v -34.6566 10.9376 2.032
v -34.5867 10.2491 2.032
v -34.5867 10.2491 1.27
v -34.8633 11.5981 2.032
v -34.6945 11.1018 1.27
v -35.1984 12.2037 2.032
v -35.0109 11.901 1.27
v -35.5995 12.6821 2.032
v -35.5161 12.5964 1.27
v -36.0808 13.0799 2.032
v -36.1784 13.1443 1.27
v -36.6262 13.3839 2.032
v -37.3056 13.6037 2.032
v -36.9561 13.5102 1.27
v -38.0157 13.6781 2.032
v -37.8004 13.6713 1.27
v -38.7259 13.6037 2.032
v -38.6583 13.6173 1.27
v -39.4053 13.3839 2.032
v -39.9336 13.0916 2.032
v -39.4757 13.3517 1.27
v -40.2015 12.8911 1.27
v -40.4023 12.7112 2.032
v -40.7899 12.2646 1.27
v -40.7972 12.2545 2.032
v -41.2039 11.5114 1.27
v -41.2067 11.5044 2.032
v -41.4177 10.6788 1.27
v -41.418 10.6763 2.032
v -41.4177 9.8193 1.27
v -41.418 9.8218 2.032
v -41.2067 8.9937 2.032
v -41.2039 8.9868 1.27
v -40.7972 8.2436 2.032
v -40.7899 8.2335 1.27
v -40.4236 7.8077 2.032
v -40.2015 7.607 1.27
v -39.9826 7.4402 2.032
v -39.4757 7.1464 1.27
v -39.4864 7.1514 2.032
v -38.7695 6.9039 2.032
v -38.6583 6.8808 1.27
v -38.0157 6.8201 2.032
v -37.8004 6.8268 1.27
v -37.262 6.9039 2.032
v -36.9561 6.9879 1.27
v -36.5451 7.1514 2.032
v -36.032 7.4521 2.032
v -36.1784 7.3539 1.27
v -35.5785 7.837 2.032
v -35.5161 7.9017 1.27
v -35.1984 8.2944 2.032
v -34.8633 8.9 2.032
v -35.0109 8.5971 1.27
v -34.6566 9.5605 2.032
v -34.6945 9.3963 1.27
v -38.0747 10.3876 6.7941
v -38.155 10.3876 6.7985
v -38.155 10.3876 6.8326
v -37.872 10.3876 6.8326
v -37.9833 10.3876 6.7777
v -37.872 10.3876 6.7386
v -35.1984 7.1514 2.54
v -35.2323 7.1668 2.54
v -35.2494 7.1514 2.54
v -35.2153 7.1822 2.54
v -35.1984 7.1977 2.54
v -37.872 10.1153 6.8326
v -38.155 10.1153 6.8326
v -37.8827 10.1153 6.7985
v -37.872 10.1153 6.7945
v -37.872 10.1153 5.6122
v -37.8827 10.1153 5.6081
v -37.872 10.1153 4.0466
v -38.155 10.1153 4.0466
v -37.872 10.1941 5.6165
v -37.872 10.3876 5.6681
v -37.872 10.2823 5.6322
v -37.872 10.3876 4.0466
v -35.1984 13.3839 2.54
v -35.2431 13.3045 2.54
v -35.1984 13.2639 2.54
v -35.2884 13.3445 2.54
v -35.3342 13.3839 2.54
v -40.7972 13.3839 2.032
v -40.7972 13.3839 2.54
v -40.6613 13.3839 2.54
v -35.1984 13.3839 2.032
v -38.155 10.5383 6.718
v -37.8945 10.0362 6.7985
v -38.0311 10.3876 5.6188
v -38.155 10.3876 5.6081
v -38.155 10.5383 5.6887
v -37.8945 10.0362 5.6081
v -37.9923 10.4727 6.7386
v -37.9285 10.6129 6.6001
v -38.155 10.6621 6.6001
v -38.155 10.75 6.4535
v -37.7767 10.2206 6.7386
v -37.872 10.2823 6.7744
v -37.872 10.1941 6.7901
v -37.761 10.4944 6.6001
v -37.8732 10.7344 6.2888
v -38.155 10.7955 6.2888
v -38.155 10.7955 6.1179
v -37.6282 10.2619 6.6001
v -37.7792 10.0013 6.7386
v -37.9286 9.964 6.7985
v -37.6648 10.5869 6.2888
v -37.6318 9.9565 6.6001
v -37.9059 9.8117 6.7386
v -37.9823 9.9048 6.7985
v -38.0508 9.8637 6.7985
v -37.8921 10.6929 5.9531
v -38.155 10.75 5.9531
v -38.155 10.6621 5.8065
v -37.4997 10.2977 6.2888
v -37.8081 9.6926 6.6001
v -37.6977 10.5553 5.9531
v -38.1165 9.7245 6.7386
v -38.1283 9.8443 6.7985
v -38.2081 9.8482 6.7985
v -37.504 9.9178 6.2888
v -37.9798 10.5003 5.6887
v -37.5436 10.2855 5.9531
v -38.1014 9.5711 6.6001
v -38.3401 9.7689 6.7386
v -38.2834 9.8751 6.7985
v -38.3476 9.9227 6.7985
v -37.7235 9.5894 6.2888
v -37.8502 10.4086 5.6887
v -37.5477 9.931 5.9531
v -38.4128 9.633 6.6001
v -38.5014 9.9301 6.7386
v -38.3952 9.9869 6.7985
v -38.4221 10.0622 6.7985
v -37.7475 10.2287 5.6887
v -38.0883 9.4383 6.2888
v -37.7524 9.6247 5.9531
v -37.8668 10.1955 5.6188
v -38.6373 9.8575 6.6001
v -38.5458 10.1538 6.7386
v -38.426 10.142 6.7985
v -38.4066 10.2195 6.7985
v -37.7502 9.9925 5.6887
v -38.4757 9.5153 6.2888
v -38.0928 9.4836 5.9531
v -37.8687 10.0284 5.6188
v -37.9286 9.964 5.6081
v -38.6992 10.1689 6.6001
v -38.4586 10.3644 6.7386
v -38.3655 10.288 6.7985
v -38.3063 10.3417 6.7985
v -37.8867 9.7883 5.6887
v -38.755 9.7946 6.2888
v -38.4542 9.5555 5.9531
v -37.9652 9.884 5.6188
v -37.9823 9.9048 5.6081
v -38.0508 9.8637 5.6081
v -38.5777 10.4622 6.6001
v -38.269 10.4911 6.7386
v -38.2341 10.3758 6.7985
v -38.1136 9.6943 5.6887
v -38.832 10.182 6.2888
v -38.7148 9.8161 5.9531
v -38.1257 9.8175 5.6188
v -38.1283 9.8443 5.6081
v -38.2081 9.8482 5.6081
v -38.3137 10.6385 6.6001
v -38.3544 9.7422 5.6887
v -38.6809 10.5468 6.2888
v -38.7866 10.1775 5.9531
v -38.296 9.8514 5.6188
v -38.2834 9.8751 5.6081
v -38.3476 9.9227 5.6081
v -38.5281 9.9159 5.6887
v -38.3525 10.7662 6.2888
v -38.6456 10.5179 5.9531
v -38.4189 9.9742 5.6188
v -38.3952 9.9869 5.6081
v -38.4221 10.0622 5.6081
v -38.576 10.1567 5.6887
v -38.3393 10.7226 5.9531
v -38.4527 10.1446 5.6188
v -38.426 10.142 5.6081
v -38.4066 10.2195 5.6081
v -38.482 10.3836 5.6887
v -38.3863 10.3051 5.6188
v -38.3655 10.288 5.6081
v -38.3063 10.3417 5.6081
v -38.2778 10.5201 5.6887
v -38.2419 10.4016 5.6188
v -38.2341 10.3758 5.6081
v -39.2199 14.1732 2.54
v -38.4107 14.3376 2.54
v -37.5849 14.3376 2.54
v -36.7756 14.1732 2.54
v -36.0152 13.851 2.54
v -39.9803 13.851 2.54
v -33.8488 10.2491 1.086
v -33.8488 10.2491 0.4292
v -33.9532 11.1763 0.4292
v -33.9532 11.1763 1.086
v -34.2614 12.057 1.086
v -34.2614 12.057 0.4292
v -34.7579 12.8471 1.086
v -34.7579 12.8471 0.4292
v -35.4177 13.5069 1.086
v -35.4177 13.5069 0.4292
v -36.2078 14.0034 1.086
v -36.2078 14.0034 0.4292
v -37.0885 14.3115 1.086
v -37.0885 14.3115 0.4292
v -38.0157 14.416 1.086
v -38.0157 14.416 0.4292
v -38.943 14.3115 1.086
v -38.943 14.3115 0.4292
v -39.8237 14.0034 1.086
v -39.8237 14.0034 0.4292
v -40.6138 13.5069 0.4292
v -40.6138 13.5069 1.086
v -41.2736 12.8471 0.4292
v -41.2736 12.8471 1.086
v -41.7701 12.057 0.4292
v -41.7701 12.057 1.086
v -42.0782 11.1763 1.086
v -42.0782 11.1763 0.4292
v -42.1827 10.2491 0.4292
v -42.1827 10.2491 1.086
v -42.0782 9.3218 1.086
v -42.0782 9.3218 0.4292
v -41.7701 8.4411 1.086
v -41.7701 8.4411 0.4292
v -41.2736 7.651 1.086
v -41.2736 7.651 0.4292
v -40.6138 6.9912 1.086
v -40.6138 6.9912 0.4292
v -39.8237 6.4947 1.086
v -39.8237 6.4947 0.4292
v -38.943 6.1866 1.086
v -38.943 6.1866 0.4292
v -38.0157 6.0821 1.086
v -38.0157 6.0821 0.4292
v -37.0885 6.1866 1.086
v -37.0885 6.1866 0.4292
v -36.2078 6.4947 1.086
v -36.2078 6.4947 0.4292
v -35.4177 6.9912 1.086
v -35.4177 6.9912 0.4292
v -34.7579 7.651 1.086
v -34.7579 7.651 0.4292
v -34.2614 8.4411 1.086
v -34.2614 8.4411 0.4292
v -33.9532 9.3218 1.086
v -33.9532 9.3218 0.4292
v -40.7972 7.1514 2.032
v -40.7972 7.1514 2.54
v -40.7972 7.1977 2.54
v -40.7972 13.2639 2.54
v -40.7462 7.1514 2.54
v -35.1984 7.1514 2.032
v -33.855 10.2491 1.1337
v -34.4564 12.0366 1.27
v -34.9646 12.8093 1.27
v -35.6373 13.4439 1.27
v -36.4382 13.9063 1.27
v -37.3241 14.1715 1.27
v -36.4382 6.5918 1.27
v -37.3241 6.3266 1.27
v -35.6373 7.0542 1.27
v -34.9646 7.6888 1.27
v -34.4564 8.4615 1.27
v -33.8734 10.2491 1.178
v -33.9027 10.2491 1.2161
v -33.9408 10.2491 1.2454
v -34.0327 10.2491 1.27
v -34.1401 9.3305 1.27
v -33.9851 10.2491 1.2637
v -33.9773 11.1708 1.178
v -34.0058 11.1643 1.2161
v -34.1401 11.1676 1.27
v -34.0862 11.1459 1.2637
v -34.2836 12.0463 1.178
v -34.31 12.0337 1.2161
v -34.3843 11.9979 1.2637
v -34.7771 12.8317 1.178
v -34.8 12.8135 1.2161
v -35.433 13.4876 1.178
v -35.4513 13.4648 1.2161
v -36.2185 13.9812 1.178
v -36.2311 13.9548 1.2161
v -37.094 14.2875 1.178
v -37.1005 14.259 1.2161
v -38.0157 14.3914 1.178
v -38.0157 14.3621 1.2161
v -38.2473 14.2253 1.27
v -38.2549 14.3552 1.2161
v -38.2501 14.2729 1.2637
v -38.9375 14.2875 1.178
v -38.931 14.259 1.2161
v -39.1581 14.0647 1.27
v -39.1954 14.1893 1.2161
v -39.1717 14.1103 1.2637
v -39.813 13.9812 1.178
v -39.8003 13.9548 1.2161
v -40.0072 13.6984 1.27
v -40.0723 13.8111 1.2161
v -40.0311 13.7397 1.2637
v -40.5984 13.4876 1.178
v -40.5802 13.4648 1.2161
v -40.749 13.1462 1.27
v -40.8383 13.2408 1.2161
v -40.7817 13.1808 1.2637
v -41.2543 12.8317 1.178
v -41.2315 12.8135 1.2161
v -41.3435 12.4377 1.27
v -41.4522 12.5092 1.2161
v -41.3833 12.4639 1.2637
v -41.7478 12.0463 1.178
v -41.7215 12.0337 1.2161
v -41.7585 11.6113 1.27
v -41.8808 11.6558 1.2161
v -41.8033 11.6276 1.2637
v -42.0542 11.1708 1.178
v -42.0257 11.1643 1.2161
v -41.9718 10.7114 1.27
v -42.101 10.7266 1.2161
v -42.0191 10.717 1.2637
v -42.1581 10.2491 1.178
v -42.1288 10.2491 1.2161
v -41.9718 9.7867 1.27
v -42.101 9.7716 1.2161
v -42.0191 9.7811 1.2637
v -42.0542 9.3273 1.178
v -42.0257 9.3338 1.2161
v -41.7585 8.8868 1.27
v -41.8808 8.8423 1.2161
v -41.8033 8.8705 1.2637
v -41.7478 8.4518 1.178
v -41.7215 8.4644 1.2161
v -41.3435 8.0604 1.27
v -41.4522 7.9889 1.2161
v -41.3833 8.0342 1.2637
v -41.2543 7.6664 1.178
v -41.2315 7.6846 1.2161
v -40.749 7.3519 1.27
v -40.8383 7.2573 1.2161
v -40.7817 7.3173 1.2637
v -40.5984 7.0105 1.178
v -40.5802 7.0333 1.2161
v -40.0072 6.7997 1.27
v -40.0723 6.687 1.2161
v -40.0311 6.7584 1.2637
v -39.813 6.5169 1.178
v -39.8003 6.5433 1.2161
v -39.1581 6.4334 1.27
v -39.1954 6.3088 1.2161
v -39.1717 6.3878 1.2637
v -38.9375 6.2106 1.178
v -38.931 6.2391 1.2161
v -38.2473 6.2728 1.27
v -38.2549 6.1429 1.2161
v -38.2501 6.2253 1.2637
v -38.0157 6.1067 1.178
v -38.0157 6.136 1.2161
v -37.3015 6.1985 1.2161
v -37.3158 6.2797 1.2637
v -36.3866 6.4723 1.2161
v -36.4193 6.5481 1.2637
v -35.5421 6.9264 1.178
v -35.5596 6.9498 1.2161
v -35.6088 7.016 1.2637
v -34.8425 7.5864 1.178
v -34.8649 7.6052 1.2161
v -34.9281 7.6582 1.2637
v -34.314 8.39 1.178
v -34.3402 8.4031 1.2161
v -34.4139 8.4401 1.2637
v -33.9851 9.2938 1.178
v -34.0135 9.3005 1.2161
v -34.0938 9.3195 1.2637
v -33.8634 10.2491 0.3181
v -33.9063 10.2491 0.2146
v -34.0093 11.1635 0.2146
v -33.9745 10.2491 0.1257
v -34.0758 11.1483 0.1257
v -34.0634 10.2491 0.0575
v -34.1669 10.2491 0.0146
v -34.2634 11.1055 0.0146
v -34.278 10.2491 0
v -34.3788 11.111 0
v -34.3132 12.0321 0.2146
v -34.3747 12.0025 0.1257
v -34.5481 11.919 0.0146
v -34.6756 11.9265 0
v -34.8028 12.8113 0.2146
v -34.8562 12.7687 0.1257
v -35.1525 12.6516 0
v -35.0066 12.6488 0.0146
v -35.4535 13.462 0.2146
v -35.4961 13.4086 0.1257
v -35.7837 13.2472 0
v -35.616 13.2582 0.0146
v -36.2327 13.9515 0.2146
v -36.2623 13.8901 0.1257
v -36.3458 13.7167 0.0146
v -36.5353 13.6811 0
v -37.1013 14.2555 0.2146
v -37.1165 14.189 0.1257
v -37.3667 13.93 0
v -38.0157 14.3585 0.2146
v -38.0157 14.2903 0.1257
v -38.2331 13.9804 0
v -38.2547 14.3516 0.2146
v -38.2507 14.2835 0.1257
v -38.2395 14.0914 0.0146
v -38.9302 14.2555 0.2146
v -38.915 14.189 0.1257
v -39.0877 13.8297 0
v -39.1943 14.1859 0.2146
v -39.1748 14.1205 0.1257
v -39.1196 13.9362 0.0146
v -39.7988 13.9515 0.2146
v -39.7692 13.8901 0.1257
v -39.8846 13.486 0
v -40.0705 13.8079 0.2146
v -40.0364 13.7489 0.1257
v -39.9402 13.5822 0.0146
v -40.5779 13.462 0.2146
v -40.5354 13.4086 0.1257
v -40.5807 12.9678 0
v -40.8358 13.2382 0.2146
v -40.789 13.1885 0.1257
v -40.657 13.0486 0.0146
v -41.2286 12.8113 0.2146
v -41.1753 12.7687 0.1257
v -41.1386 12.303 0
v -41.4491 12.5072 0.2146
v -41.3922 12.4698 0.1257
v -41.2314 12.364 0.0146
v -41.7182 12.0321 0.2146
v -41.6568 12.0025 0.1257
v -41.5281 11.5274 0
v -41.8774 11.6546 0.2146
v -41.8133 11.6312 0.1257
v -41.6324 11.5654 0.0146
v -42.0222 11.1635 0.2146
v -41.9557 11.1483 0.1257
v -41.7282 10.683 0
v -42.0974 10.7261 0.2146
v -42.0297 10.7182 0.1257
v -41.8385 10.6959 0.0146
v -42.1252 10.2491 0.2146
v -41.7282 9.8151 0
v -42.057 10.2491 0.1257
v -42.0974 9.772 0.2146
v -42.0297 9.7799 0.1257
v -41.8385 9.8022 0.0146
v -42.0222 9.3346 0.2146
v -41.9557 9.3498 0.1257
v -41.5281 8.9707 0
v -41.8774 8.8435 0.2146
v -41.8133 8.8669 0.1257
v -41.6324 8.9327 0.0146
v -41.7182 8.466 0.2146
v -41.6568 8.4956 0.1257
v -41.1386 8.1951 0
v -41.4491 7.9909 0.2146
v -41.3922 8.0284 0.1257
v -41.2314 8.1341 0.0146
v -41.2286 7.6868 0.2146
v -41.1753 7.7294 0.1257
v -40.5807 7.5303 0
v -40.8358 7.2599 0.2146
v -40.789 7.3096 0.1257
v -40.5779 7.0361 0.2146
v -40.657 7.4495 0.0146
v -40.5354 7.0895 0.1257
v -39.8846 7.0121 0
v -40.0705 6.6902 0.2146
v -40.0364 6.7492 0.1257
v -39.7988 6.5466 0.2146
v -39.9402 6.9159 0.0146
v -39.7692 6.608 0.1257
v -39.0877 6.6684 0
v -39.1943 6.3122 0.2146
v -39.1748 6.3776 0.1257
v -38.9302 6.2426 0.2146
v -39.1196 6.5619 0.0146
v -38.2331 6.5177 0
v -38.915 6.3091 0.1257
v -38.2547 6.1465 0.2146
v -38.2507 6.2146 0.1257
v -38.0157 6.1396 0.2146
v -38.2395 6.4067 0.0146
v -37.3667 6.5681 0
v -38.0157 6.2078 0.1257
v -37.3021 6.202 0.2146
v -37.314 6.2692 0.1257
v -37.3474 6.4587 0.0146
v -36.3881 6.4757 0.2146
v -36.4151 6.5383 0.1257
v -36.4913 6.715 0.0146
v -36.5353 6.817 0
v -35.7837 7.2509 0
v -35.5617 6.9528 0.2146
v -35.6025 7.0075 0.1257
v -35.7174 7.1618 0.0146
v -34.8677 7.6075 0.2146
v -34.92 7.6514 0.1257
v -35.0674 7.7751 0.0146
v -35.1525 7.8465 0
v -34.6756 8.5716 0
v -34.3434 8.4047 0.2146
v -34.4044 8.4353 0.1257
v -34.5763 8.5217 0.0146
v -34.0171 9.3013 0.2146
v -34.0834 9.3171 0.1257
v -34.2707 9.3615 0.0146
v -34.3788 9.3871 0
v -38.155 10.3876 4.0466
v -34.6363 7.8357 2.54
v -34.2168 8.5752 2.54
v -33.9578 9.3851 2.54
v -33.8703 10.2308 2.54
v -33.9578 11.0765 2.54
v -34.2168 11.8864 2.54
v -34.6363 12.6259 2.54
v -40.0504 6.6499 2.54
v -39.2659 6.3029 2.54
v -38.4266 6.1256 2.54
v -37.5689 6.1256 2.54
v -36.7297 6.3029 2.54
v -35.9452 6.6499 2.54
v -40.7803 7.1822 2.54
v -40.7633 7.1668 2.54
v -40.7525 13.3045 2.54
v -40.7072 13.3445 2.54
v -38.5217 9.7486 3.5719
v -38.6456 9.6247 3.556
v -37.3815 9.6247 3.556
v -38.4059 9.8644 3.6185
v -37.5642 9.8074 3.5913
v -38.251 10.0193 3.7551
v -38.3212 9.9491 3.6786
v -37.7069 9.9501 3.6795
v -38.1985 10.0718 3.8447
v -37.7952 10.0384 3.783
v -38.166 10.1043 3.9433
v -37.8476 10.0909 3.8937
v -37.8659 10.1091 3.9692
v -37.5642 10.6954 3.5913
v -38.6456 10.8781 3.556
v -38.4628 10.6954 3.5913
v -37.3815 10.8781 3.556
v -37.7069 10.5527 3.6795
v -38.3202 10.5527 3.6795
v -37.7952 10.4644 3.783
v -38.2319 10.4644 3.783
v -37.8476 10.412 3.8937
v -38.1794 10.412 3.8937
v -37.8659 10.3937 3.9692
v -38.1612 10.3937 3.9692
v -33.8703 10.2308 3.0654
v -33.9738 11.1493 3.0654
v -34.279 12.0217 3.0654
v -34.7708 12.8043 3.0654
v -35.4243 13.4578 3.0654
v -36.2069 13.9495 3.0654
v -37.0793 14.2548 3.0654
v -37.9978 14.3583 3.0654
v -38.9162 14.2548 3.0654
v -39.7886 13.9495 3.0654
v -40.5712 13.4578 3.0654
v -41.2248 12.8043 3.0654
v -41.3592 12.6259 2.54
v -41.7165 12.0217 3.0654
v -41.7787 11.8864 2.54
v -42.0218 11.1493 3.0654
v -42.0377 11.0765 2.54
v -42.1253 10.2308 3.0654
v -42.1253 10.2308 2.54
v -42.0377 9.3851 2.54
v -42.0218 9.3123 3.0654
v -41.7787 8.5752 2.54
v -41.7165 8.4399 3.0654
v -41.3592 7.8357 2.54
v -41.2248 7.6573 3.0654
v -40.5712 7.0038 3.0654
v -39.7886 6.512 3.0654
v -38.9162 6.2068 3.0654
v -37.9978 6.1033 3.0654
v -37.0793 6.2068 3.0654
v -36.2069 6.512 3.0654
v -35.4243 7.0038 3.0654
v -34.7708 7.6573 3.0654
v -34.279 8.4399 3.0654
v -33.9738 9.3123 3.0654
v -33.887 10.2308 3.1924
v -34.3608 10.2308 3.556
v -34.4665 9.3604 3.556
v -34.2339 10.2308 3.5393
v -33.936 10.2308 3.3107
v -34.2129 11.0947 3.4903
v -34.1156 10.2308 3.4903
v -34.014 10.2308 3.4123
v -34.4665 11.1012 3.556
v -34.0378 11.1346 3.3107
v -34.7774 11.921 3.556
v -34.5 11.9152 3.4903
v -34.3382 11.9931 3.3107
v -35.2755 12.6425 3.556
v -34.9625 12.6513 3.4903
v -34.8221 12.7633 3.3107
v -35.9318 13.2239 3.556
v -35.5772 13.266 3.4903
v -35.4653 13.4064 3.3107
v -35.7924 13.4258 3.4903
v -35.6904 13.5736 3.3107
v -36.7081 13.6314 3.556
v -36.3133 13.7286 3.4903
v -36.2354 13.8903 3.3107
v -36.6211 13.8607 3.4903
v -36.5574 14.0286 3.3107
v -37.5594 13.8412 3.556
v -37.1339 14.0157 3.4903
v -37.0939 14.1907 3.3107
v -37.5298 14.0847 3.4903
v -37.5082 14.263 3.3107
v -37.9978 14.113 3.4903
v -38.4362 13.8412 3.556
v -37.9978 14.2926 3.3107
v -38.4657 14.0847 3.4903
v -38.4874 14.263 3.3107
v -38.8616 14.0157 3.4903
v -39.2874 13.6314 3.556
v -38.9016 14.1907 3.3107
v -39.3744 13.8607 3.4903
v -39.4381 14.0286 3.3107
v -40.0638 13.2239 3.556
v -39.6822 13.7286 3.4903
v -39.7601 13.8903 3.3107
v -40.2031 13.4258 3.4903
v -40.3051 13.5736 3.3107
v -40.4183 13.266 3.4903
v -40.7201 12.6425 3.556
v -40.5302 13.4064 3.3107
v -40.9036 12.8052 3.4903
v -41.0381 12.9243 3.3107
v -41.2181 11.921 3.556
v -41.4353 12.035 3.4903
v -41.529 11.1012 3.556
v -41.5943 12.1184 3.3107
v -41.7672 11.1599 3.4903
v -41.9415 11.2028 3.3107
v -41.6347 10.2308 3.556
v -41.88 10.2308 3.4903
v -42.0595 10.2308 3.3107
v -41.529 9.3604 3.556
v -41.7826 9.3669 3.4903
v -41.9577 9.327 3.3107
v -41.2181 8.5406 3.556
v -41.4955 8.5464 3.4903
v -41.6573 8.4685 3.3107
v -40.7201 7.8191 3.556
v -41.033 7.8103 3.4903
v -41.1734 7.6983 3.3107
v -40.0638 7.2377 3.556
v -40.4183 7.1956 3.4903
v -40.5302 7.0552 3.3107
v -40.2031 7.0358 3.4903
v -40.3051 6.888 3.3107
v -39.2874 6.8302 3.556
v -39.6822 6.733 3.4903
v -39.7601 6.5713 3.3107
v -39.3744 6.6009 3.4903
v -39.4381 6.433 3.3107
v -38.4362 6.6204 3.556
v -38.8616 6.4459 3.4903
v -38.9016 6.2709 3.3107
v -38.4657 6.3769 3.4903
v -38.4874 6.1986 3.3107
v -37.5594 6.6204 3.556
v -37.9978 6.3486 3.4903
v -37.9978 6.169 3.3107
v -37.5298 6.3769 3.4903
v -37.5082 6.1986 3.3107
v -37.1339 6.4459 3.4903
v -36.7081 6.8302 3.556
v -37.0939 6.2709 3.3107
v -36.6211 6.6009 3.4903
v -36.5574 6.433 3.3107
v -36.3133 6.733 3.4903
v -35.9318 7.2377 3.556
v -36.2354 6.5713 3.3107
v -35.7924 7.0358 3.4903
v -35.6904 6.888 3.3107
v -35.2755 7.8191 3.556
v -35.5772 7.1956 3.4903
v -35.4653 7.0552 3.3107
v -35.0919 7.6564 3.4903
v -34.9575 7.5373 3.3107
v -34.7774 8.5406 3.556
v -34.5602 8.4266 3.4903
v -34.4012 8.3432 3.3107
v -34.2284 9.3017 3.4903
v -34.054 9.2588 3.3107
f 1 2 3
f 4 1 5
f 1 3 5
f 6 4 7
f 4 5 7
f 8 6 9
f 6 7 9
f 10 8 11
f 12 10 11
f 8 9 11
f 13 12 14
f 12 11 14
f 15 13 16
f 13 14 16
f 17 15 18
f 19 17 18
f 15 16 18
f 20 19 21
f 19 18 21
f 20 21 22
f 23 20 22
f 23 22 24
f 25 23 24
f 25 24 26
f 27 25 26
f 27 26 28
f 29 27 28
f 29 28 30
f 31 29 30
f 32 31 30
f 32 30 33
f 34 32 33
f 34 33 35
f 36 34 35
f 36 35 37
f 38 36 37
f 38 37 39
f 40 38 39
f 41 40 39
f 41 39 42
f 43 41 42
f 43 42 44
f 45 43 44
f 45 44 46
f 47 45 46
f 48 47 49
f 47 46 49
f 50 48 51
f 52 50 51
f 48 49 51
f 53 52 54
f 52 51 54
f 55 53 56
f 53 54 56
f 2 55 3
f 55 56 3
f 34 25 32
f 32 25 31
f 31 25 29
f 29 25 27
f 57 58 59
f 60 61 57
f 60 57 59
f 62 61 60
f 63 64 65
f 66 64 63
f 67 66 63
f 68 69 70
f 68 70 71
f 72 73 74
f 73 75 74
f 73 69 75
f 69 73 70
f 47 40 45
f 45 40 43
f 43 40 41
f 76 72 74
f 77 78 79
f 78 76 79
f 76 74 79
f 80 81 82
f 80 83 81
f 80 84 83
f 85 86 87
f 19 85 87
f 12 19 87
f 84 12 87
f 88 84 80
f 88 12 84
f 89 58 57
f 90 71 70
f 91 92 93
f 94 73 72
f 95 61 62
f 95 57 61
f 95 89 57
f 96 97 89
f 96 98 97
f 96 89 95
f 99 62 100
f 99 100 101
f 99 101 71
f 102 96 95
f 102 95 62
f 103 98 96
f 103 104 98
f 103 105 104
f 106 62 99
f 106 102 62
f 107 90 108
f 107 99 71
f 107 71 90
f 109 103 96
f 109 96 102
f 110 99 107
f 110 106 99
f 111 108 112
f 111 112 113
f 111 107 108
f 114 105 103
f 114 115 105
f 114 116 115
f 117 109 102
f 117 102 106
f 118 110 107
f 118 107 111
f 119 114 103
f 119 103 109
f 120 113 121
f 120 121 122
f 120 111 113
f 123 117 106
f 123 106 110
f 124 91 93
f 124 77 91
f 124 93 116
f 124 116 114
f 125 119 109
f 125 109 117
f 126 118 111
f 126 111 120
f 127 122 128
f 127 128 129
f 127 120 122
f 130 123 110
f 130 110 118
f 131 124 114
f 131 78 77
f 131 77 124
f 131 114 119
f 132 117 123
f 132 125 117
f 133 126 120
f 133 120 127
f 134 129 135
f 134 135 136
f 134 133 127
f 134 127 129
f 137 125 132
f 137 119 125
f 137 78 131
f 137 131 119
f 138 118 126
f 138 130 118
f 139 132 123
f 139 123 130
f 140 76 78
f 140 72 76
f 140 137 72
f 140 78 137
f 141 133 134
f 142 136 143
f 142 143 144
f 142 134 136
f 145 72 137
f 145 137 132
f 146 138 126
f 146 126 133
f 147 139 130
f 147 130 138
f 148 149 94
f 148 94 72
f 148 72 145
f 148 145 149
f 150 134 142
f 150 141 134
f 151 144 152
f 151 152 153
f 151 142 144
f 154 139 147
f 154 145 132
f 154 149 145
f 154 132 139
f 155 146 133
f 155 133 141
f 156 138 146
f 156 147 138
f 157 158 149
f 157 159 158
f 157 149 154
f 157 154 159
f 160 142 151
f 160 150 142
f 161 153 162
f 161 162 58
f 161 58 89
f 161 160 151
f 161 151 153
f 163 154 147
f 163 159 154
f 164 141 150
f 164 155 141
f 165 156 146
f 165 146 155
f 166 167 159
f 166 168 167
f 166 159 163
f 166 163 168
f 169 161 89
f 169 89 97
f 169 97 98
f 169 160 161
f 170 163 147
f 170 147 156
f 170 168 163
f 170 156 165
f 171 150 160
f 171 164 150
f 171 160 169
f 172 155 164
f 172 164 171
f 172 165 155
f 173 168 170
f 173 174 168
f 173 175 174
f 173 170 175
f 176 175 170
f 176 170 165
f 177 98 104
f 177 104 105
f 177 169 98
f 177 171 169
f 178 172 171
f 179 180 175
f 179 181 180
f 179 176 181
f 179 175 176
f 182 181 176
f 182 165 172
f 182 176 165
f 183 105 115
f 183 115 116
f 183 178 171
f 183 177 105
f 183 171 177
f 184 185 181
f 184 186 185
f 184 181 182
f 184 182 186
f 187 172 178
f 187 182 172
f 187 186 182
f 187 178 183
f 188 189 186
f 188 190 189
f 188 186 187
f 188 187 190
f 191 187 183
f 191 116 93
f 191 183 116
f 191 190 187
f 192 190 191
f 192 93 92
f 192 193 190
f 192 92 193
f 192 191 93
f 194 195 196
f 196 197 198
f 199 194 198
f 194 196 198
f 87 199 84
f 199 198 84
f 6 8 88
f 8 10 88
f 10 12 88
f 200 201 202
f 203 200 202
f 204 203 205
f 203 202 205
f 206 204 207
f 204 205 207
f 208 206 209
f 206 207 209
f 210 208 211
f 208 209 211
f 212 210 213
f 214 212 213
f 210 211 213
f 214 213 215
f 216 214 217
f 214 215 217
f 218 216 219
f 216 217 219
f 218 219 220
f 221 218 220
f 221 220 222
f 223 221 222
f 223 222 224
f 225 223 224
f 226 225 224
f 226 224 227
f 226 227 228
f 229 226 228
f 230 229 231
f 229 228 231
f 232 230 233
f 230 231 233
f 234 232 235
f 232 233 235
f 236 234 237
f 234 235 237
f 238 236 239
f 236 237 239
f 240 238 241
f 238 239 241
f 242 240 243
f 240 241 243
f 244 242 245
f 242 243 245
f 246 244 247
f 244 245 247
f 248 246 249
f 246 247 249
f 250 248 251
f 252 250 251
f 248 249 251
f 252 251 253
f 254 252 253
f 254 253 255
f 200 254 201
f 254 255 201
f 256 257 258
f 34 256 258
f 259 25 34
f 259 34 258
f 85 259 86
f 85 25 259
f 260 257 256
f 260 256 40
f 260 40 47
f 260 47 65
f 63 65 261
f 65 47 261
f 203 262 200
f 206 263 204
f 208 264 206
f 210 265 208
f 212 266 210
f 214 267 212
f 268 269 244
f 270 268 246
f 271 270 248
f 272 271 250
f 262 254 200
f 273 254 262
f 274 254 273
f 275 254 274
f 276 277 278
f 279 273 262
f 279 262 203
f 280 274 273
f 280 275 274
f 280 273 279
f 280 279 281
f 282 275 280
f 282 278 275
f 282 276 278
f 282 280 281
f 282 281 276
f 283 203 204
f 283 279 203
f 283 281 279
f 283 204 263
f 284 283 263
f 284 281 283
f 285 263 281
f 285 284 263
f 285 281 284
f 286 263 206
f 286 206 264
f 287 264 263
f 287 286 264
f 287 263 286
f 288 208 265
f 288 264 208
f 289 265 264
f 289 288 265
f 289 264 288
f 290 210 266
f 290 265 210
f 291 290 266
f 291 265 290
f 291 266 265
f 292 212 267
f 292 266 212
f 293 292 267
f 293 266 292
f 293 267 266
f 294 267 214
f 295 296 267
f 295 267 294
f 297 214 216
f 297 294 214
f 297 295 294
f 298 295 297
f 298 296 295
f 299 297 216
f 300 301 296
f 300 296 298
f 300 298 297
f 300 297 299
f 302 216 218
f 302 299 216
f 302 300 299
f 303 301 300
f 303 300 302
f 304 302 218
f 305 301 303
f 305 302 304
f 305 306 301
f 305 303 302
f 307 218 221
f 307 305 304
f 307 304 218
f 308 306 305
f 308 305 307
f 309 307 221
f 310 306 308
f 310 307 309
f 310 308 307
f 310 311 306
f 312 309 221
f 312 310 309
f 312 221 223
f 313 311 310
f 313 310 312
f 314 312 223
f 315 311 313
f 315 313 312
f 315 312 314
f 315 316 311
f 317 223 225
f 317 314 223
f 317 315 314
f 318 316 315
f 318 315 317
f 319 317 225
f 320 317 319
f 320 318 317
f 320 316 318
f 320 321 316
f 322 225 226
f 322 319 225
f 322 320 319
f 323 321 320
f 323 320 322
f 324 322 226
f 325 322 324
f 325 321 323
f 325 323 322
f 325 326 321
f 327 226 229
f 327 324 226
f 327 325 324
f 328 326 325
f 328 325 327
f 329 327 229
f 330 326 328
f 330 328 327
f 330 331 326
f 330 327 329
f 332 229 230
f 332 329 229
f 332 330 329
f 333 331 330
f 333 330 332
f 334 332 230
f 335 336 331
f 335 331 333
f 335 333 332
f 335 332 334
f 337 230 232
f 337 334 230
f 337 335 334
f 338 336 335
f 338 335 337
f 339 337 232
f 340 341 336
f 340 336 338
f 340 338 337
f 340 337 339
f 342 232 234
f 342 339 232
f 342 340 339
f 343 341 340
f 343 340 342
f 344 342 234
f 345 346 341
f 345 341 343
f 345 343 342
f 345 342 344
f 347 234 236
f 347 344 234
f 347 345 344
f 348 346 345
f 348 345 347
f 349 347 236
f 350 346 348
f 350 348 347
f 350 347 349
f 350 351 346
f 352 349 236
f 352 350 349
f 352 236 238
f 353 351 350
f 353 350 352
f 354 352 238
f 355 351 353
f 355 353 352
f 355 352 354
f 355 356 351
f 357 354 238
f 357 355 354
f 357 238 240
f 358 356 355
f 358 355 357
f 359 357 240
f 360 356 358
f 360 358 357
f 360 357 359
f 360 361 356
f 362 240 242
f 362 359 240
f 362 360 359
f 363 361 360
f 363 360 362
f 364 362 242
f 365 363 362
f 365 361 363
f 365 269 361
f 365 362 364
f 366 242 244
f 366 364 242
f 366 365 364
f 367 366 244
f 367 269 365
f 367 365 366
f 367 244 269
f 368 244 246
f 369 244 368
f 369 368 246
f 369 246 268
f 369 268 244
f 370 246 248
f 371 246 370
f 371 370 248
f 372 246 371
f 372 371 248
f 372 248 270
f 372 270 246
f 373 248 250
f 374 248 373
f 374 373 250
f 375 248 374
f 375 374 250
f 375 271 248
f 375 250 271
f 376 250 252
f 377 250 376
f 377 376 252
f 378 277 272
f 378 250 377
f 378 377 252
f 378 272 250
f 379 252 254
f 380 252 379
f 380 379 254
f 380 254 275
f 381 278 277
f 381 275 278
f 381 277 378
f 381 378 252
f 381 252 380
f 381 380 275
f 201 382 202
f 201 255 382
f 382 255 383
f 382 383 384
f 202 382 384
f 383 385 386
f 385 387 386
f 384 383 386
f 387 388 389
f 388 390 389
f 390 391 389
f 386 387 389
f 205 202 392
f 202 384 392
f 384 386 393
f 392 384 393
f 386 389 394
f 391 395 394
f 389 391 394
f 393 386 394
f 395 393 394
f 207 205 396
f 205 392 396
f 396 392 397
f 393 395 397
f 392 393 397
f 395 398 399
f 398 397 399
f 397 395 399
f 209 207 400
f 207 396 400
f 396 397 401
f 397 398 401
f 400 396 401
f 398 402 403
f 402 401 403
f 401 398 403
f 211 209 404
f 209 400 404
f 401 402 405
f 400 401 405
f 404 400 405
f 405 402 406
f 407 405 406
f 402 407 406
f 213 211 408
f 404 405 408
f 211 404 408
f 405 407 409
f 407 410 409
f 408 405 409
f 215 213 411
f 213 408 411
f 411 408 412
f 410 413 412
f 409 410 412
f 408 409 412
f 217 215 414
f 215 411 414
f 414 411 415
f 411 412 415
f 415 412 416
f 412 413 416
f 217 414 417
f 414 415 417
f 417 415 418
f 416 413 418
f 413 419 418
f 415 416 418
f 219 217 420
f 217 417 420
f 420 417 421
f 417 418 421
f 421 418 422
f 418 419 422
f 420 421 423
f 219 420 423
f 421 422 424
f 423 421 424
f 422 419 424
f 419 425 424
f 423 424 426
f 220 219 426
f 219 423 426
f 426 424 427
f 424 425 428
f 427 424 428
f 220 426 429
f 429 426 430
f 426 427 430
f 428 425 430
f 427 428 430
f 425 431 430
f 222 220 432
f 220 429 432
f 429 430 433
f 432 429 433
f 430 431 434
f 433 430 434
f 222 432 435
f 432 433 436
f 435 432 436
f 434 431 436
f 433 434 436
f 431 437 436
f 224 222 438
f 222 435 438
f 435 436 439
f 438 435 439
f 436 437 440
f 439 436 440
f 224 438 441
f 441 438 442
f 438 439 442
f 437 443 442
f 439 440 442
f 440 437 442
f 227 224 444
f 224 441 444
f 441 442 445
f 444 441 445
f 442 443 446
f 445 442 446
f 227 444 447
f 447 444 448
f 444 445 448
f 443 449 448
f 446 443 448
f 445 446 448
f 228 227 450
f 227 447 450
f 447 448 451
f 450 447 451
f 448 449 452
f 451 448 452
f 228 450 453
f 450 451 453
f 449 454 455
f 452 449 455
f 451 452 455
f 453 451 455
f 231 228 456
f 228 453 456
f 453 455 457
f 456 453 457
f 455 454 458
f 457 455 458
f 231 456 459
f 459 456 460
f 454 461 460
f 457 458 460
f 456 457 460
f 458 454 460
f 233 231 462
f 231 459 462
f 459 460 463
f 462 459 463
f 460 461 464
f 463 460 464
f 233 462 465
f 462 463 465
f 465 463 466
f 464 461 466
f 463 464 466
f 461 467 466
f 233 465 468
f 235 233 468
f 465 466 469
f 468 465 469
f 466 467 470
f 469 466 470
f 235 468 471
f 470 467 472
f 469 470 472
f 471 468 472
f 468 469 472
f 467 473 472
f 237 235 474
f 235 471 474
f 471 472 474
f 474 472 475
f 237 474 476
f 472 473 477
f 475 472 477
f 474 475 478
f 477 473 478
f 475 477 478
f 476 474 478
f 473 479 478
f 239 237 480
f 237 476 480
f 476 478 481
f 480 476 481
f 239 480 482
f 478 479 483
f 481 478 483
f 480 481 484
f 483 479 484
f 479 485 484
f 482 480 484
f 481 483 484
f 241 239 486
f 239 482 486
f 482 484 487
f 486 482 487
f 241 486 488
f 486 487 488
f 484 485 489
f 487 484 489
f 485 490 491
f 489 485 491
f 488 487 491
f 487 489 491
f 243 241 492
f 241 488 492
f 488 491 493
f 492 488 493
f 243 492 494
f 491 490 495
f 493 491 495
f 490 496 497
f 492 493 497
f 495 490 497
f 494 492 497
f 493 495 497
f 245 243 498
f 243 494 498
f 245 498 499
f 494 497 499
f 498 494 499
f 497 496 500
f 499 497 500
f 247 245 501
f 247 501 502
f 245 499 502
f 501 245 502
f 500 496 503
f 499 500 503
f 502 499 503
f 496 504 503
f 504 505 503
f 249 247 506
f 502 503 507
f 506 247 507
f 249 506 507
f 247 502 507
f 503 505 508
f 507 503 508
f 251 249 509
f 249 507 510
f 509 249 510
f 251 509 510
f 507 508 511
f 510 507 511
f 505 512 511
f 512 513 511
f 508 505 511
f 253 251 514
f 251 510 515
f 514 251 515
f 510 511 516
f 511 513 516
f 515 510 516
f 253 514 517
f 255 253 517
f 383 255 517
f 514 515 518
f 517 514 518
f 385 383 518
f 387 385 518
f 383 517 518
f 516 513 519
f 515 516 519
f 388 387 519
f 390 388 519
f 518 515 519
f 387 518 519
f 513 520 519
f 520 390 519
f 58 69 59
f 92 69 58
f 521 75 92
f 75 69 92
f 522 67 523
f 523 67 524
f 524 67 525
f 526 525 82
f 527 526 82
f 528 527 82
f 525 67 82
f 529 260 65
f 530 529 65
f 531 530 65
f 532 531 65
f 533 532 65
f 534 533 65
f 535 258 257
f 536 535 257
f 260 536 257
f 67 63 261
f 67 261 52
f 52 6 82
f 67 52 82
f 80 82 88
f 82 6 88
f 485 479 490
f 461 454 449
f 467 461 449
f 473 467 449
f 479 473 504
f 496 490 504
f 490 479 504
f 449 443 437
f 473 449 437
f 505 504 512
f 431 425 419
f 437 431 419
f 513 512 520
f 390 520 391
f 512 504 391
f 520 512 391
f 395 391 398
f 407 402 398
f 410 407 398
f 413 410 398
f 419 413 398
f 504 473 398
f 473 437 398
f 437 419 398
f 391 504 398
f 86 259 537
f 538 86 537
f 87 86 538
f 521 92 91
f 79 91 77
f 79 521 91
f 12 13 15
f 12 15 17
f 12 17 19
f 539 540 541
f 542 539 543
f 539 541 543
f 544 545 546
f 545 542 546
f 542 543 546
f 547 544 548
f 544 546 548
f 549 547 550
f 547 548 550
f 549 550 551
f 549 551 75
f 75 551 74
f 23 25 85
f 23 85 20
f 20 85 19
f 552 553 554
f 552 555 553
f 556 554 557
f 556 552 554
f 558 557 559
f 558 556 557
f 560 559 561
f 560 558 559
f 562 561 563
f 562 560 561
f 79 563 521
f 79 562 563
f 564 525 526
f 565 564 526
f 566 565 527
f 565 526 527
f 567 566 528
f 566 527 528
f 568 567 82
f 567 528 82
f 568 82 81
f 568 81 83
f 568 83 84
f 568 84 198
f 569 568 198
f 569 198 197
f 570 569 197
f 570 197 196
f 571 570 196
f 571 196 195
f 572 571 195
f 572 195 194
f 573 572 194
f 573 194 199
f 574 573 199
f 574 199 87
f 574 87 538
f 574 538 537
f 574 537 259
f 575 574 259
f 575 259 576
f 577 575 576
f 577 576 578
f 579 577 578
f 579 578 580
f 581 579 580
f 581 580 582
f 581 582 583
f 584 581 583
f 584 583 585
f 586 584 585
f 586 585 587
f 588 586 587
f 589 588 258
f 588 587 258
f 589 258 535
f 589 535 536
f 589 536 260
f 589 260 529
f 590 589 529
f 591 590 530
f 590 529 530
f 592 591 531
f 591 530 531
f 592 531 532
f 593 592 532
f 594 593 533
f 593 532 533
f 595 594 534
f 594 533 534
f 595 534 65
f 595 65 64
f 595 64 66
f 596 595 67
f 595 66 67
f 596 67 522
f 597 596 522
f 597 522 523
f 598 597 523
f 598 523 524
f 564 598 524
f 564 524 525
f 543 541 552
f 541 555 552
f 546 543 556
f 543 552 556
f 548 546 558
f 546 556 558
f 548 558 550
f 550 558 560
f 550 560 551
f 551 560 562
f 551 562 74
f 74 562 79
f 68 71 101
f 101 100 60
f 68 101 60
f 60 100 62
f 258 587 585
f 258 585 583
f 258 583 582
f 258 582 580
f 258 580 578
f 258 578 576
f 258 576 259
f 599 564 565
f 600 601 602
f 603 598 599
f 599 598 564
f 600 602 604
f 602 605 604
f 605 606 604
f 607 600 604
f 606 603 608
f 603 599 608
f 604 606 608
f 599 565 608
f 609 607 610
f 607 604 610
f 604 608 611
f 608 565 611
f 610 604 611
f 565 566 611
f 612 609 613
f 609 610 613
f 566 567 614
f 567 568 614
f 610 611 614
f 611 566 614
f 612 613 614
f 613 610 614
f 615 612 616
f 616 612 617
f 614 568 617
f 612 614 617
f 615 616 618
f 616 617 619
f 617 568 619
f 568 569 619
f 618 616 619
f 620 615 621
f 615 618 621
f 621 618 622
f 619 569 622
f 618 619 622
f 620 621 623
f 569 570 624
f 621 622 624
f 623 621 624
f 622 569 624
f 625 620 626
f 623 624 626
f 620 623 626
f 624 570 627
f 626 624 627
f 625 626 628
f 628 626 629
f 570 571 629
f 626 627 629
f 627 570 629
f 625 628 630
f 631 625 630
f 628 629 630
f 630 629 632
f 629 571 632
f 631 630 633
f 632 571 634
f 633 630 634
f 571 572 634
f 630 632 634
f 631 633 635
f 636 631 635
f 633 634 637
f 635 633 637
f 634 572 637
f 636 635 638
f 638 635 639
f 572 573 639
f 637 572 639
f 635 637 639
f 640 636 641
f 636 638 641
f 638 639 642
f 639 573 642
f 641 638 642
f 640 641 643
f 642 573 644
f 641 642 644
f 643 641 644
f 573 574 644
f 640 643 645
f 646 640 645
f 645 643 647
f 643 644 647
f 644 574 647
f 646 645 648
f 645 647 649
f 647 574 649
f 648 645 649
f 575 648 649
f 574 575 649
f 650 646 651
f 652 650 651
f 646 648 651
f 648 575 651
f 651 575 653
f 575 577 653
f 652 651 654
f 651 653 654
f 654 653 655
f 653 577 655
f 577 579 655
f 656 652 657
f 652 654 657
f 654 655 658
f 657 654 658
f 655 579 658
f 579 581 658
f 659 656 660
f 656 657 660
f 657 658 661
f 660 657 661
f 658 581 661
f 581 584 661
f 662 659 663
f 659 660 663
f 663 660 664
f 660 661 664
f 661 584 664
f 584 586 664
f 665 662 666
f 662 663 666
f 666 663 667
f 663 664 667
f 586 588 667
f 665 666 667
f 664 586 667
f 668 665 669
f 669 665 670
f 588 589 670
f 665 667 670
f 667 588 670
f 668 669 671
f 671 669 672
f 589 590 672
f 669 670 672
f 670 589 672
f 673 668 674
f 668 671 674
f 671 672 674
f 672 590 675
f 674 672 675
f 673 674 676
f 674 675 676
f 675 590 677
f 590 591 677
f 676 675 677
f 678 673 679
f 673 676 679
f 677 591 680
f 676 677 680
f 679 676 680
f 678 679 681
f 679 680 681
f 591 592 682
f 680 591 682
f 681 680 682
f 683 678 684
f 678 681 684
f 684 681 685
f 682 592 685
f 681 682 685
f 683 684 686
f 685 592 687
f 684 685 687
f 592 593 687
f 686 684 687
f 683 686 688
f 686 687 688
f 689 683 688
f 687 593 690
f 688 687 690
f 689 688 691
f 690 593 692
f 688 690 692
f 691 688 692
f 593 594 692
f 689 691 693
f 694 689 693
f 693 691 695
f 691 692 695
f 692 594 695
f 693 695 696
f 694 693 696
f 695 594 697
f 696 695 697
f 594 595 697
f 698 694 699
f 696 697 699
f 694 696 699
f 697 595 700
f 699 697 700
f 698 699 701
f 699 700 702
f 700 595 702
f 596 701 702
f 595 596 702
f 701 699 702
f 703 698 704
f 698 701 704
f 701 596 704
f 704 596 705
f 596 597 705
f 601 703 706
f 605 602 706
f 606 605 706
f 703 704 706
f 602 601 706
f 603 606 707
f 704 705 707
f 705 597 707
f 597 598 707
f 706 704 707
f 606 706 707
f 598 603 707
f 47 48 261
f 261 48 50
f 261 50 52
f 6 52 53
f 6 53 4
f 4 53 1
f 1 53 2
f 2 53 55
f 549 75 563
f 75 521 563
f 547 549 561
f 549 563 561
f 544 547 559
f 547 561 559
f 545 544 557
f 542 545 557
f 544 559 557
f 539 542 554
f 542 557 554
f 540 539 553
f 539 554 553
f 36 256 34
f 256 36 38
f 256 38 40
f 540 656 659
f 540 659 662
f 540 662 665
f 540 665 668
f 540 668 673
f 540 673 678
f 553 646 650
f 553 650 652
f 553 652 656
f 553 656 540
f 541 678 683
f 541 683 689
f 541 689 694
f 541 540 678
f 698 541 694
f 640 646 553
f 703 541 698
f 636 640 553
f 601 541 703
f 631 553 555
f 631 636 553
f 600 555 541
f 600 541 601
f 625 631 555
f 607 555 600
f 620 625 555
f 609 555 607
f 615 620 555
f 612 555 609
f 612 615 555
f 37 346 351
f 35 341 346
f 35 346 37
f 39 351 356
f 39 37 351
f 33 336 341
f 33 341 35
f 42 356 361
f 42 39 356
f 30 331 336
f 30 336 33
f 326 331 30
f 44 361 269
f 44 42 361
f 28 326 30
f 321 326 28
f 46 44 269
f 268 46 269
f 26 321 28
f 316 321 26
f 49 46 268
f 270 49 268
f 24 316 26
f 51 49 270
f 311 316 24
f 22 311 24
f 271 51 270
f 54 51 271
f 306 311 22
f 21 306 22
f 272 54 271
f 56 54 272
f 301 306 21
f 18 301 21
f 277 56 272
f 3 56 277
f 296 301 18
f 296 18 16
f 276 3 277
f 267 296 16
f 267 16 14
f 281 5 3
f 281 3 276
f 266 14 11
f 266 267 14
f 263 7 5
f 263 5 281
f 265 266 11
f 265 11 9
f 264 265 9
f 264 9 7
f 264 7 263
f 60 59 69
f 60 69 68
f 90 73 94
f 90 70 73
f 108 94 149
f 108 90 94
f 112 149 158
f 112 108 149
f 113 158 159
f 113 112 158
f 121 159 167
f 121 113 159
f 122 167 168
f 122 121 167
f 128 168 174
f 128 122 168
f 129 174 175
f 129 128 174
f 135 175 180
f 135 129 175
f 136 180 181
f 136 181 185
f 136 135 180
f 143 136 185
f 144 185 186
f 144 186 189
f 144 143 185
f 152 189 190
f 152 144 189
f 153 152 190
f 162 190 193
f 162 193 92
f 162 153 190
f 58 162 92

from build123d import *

# Parameters (mm, degrees)
F0_R      = 4.1669678751
F2_DEPTH  = 1.27
F3_R      = 3.429
F4_DEPTH  = 0.762
F5_W      = 5.5987872183
F5_H      = 6.2324469909
F6_DEPTH  = 0.508
F7_R      = 4.1275
F8_DEPTH  = 1.016
F10_W     = 0.2829879522
F10_H     = 0.2722851932
F11_DEPTH = 3.2766
F14_R     = 0.4905681959
F15_R     = 0.4292471714
F16_R     = 0.1839630735


with BuildPart() as f2:
    # F0 (on Top) → F2 (new body)
    with BuildSketch(Plane.XY):
        with Locations((-38.0157418549, 10.2490512654)):
            Circle(F0_R)
    extrude(amount=F2_DEPTH)

    # F3 (on face) → F4 (join)
    with BuildSketch(Plane.XY.offset(1.27)):
        with Locations((-38.0157418549, 10.2490512654)):
            Circle(F3_R)
    extrude(amount=F4_DEPTH)

    # F5 (on face) → F6 (join)
    with BuildSketch(Plane.XY.offset(2.032)):
        with Locations((-37.9977691919, 10.2676521055)):
            Rectangle(F5_W, F5_H)
    extrude(amount=F6_DEPTH)

    # F7 (on face) → F8 (join)
    with BuildSketch(Plane.XY.offset(2.54)):
        with Locations((-37.9977691919, 10.2307982743)):
            Circle(F7_R)
    extrude(amount=F8_DEPTH)

    # F10 (on face) → F11 (join)
    with BuildSketch(Plane.XY.offset(3.556)):
        with Locations((-38.0135253072, 10.2514149621)):
            Rectangle(F10_W, F10_H)
    extrude(amount=F11_DEPTH)

    # F12 (on face) → F13 (revolve)
    with BuildSketch(Plane(origin=(-38.1550192833, 0, 0), x_dir=(0, -1, 0), z_dir=(-1, 0, 0))):
        with BuildLine():
            Line((-10.3875575587, 5.6081162018), (-10.3875575587, 6.7985399348))
            ThreePointArc((-10.3875575587, 6.7985399348), (-10.8013159849, 6.2033280683), (-10.3875575587, 5.6081162018))
        make_face()
    revolve(axis=Axis((-38.1550192833, 10.1152723655, 5.1943), (0, 0, -1)))

    # F14
    f14_edges = [f2.edges().sort_by_distance(p)[0] for p in [
        (-42.125269, 10.230798, 3.556),
        (-37.872031, 10.251415, 3.556),
        (-38.013525, 10.387558, 3.556),
        (-38.155019, 10.251415, 3.556),
        (-38.013525, 10.115272, 3.556),
    ]]
    fillet(f14_edges, radius=F14_R)

    # F15
    f15_edges = [f2.edges().sort_by_distance(p)[0] for p in [
        (-42.18271, 10.249051, 0),
    ]]
    fillet(f15_edges, radius=F15_R)

    # F16
    f16_edges = [f2.edges().sort_by_distance(p)[0] for p in [
        (-42.18271, 10.249051, 1.27),
    ]]
    fillet(f16_edges, radius=F16_R)


solid = f2.part
